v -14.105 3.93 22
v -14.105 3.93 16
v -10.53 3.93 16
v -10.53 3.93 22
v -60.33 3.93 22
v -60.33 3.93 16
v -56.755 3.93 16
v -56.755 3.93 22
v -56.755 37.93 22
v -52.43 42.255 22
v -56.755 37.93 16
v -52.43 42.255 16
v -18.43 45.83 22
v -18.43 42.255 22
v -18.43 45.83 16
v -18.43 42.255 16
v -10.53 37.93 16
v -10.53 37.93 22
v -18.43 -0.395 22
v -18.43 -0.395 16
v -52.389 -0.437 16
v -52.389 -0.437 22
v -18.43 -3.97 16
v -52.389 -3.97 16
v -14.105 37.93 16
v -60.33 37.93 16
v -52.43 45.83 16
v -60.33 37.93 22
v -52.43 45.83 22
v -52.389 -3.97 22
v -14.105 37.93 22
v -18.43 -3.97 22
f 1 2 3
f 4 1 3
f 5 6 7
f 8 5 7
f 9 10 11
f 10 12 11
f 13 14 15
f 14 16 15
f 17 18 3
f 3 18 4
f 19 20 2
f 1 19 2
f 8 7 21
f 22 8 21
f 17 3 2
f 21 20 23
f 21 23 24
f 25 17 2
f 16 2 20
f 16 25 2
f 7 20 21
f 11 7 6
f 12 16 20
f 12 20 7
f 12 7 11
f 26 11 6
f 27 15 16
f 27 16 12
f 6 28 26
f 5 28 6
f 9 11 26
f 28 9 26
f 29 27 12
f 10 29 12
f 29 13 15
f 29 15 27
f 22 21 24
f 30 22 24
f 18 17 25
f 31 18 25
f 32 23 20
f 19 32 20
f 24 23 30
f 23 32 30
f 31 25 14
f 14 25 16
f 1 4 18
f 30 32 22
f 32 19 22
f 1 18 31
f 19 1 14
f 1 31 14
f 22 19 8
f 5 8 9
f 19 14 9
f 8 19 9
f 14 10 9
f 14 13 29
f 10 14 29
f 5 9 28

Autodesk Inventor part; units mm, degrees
ref_plane "YZ Plane" through (0, 0, 0) normal (1, 0, 0) x (0, 1, 0)
ref_plane "XZ Plane" through (0, 0, 0) normal (0, 1, 0) x (-1, 0, 0)
ref_plane "Work Plane1" through (-56.3599, 0, 22) normal (0, 0, -1) x (-1, 0, 0)
sketch "Sketch1" plane through (-56.3599, 0, 22) normal (0, 0, -1) x (-1, 0, 0)
  line L0 (-4.0299, -0.3538) -> (-2.2322, 1.4439) construction
  arc A0 (-1.4439, 2.2322) -> (-2.2322, 1.4439) centre (-0.9299, 0.9299) ccw construction
  line L1 (-1.4439, 2.2322) -> (0.3538, 4.0299) construction
  line L2 (-37.8299, 42.8299) -> (-37.8299, 37.8299) construction
  line L3 (-37.8299, 37.8299) -> (-42.9208, 37.8299) construction
  line L4 (-37.8299, 42.2137) -> (-37.8299, 45.8299) construction
  line L5 (-37.8299, 45.8299) -> (-4.0299, 45.8299) construction
  line L6 (-4.0299, 45.8299) -> (-4.0299, 42.2137) construction
  line L7 (-4.0299, 4.0299) -> (0.3538, 4.0299) projected
  circle A1 centre (-20.9299, 20.9299) radius 17.5 projected
  line L8 (-20.9299, 58.9723) -> (17.1124, 20.9299) construction
  line L9 (17.1124, 20.9299) -> (-20.9299, -17.1124) construction
  line L10 (-20.9299, -17.1124) -> (-58.9723, 20.9299) construction
  line L11 (-58.9723, 20.9299) -> (-20.9299, 58.9723) construction
  line L12 (-20.9299, 58.9723) -> (-20.9299, -17.1124) construction
  line L13 (17.1124, 20.9299) -> (-58.9723, 20.9299) construction
  line L14 (-20.9299, 58.9723) -> (32.8701, 58.9723) construction
  line L15 (-43.4299, 43.4299) -> (1.5701, 43.4299) construction
  line L16 (1.5701, 43.4299) -> (1.5701, -1.5701) construction
  line L17 (1.5701, -1.5701) -> (-43.4299, -1.5701) construction
  line L18 (-43.4299, -1.5701) -> (-43.4299, 43.4299) construction
  line L19 (-43.4299, 43.4299) -> (1.5701, -1.5701) construction
  line L20 (1.5701, 43.4299) -> (-43.4299, -1.5701) construction
  line L21 (-43.4299, 5.3876) -> (-43.4299, 36.4723)
  line L22 (-43.4299, 36.4723) -> (-36.4723, 43.4299)
  line L23 (-36.4723, 43.4299) -> (-5.3876, 43.4299)
  line L24 (-5.3876, 43.4299) -> (1.5701, 36.4723)
  line L25 (1.5701, 36.4723) -> (1.5701, 5.3876)
  line L26 (1.5701, 5.3876) -> (-5.3876, -1.5701)
  line L27 (-5.3876, -1.5701) -> (-36.4723, -1.5701)
  line L28 (-36.4723, -1.5701) -> (-43.4299, 5.3876)
  line L29 (-4.0299, 42.2137) -> (-37.8299, 42.2137) projected
  line L30 (-4.0299, -0.3538) -> (-4.0299, 4.0299) projected
  circle A2 centre (-20.9299, 20.9299) radius 1.5
  line L31 (-10.9299, 10.9299) -> (-30.9299, 10.9299) construction
  line L32 (-30.9299, 10.9299) -> (-30.9299, 30.9299) construction
  line L33 (-30.9299, 30.9299) -> (-10.9299, 30.9299) construction
  line L34 (-10.9299, 30.9299) -> (-10.9299, 10.9299) construction
  line L35 (-10.9299, 10.9299) -> (-30.9299, 30.9299) construction
  line L36 (-30.9299, 10.9299) -> (-10.9299, 30.9299) construction
  circle A3 centre (-30.9299, 30.9299) radius 1.4
  circle A4 centre (-30.9299, 10.9299) radius 1.4
  circle A5 centre (-10.9299, 10.9299) radius 1.4
  line L37 (-45.8299, 37.8299) -> (-42.0723, 37.8299) construction
  line L38 (-42.1723, 37.7299) -> (-45.8299, 37.7299)
  line L39 (-45.8299, 37.7299) -> (-45.8299, 4.1299)
  line L40 (-45.8299, 4.1299) -> (-42.1723, 4.1299)
  line L41 (-42.1723, 4.1299) -> (-42.1723, 37.7299)
  line L42 (-45.8299, 4.0299) -> (-42.0723, 4.0299) construction
  line L43 (-45.8299, 37.8299) -> (-42.0723, 37.8299) projected
  line L44 (-37.7299, 45.8299) -> (-4.1299, 45.8299)
  line L45 (-4.1299, 45.8299) -> (-4.1299, 42.1723)
  line L46 (-4.1299, 42.1723) -> (-37.7299, 42.1723)
  line L47 (-37.7299, 42.1723) -> (-37.7299, 45.8299)
  line L48 (0.4701, 37.8299) -> (0.4701, 4.0299) construction
  line L49 (0.4701, 4.0299) -> (3.9701, 4.0299) construction
  line L50 (3.9701, 37.8299) -> (3.9701, 4.0299) construction
  line L51 (0.4701, 37.8299) -> (3.9701, 37.8299) construction
  line L52 (-45.8299, -3.9701) -> (-4.0299, -3.9701) construction
  line L53 (0.3124, 37.7299) -> (3.9701, 37.7299)
  line L54 (3.9701, 37.7299) -> (3.9701, 4.1299)
  line L55 (3.9701, 4.1299) -> (0.3124, 4.1299)
  line L56 (0.3124, 4.1299) -> (0.3124, 37.7299)
  line L57 (-4.1713, -0.3538) -> (-37.7299, -0.3538)
  line L58 (-37.7299, -0.3538) -> (-37.7299, -3.9701)
  line L59 (-37.7299, -3.9701) -> (-4.1713, -3.9701)
  line L60 (-4.1713, -3.9701) -> (-4.1713, -0.3538)
  point P0 (-37.8299, 4.0299)
  dimension "d18" = 53.8
  dimension "d19" = 45
  dimension "d20" = 53.8
  dimension "d21" = 45
  dimension "d22" = 45
  dimension "d30" = 20
  dimension "d31" = 20
  dimension "d32" = 2.8
  dimension "d33" = 2.8
  dimension "d34" = 2.8
  dimension "d35" = 3
  dimension "d36" = 0.1
  dimension "d37" = 0.1
  dimension "d38" = 0.1
  dimension "d39" = 0.1
extrude "Extrusion1" add sketch "Sketch1" along normal blind 6 contours L30 L26 L57 L28 L41 L22 L46 L24 L56 L7 | L7 L26 L30 | L56 L24 L25 L26 | L26 L25 L24 L53 L54 L55 | L60 L59 L58 L57 L28 L27 L26 | L26 L27 L28 L57 | L46 L22 L29 L24 | L24 L29 L45 | L40 L39 L38 L22 L21 L28 | L28 L21 L22 L41 | L29 L22 L23 L24 | L24 L23 L22 L29 L47 L44 L45 | L47 L29 L22 | A1 | A2 | A3 | A4 | A5
sketch "Skizze4" plane through (-56.3599, 0, 16) normal (0, 0, -1) x (-1, 0, 0)
  line L0 (-37.7299, 42.1723) -> (-42.1723, 37.7299) projected
  line L1 (-42.1723, 37.7299) -> (-45.8299, 37.7299) projected
  line L2 (-45.8299, 37.7299) -> (-45.8299, 4.1299) construction
  line L3 (-45.8299, 4.1299) -> (-42.1723, 4.1299) projected
  line L4 (-42.1723, 4.1299) -> (-37.6885, -0.3538) projected
  line L5 (-37.6885, -0.3538) -> (-37.7299, -0.3538) projected
  line L6 (-37.7299, -0.3538) -> (-37.7299, -3.9701) projected
  line L7 (-37.7299, -3.9701) -> (-4.1713, -3.9701) construction
  line L8 (-4.1713, -3.9701) -> (-4.1713, -0.3538) projected
  line L9 (-4.1713, -0.3538) -> (0.3124, 4.1299) projected
  line L10 (0.3124, 4.1299) -> (3.9701, 4.1299) projected
  line L11 (3.9701, 4.1299) -> (3.9701, 37.7299) construction
  line L12 (3.9701, 37.7299) -> (0.3124, 37.7299) projected
  line L13 (0.3124, 37.7299) -> (-4.1299, 42.1723) projected
  line L14 (-4.1299, 42.1723) -> (-4.1299, 45.8299) projected
  line L15 (-4.1299, 45.8299) -> (-37.7299, 45.8299) construction
  line L16 (-37.7299, 45.8299) -> (-37.7299, 42.1723) projected
  line L17 (-37.9299, 46.0299) -> (-3.9299, 46.0299) construction
  line L18 (-3.9299, 46.0299) -> (-3.9299, 42.2551)
  line L19 (-3.9299, 42.2551) -> (0.3953, 37.9299)
  line L20 (0.3953, 37.9299) -> (4.1701, 37.9299)
  line L21 (4.1701, 37.9299) -> (4.1701, 3.9299) construction
  line L22 (4.1701, 3.9299) -> (0.3953, 3.9299)
  line L23 (0.3953, 3.9299) -> (-3.9713, -0.4367)
  line L24 (-3.9713, -0.4367) -> (-3.9713, -4.1701)
  line L25 (-3.9713, -4.1701) -> (-37.9299, -4.1701) construction
  line L26 (-37.9299, -4.1701) -> (-37.9299, -0.3953)
  line L27 (-37.9299, -0.3953) -> (-42.2551, 3.9299)
  line L28 (-42.2551, 3.9299) -> (-46.0299, 3.9299)
  line L29 (-46.0299, 3.9299) -> (-46.0299, 37.9299) construction
  line L30 (-46.0299, 37.9299) -> (-42.2551, 37.9299)
  line L31 (-42.2551, 37.9299) -> (-37.9299, 42.2551)
  line L32 (-37.9299, 42.2551) -> (-37.9299, 46.0299)
  line L33 (-45.8299, 37.7299) -> (-45.8299, 37.9299)
  line L34 (-4.1299, 45.8299) -> (-37.7299, 45.8299) projected
  line L35 (-37.7299, 45.8299) -> (-37.9299, 45.8299)
  line L36 (-4.1299, 45.8299) -> (-3.9299, 45.8299)
  line L37 (3.9701, 37.7299) -> (3.9701, 37.9299)
  line L38 (3.9701, 4.1299) -> (3.9701, 37.7299) projected
  line L39 (3.9701, 4.1299) -> (3.9701, 3.9299)
  line L40 (-4.1713, -3.9701) -> (-3.9713, -3.9701)
  line L41 (-37.7299, -3.9701) -> (-37.9299, -3.9701)
  line L42 (-45.8299, 4.1299) -> (-45.8299, 3.9299)
  point P0 (-56.3599, 0)
  dimension "d40" = 0.2
extrude "IM_offset" add sketch "Skizze4" against normal up to surface (6 mm away)
ref_plane "Arbeitsebene5" through (-35.4299, 3.9299, 22) normal (-1, 0, 0) x (0, 0, 1)
ref_plane "Arbeitsebene6" through (-18.4299, 20.9299, 22) normal (0, 1, 0) x (-1, 0, 0)
properties part number "20_Cube_Insert_Electronics_v3"
